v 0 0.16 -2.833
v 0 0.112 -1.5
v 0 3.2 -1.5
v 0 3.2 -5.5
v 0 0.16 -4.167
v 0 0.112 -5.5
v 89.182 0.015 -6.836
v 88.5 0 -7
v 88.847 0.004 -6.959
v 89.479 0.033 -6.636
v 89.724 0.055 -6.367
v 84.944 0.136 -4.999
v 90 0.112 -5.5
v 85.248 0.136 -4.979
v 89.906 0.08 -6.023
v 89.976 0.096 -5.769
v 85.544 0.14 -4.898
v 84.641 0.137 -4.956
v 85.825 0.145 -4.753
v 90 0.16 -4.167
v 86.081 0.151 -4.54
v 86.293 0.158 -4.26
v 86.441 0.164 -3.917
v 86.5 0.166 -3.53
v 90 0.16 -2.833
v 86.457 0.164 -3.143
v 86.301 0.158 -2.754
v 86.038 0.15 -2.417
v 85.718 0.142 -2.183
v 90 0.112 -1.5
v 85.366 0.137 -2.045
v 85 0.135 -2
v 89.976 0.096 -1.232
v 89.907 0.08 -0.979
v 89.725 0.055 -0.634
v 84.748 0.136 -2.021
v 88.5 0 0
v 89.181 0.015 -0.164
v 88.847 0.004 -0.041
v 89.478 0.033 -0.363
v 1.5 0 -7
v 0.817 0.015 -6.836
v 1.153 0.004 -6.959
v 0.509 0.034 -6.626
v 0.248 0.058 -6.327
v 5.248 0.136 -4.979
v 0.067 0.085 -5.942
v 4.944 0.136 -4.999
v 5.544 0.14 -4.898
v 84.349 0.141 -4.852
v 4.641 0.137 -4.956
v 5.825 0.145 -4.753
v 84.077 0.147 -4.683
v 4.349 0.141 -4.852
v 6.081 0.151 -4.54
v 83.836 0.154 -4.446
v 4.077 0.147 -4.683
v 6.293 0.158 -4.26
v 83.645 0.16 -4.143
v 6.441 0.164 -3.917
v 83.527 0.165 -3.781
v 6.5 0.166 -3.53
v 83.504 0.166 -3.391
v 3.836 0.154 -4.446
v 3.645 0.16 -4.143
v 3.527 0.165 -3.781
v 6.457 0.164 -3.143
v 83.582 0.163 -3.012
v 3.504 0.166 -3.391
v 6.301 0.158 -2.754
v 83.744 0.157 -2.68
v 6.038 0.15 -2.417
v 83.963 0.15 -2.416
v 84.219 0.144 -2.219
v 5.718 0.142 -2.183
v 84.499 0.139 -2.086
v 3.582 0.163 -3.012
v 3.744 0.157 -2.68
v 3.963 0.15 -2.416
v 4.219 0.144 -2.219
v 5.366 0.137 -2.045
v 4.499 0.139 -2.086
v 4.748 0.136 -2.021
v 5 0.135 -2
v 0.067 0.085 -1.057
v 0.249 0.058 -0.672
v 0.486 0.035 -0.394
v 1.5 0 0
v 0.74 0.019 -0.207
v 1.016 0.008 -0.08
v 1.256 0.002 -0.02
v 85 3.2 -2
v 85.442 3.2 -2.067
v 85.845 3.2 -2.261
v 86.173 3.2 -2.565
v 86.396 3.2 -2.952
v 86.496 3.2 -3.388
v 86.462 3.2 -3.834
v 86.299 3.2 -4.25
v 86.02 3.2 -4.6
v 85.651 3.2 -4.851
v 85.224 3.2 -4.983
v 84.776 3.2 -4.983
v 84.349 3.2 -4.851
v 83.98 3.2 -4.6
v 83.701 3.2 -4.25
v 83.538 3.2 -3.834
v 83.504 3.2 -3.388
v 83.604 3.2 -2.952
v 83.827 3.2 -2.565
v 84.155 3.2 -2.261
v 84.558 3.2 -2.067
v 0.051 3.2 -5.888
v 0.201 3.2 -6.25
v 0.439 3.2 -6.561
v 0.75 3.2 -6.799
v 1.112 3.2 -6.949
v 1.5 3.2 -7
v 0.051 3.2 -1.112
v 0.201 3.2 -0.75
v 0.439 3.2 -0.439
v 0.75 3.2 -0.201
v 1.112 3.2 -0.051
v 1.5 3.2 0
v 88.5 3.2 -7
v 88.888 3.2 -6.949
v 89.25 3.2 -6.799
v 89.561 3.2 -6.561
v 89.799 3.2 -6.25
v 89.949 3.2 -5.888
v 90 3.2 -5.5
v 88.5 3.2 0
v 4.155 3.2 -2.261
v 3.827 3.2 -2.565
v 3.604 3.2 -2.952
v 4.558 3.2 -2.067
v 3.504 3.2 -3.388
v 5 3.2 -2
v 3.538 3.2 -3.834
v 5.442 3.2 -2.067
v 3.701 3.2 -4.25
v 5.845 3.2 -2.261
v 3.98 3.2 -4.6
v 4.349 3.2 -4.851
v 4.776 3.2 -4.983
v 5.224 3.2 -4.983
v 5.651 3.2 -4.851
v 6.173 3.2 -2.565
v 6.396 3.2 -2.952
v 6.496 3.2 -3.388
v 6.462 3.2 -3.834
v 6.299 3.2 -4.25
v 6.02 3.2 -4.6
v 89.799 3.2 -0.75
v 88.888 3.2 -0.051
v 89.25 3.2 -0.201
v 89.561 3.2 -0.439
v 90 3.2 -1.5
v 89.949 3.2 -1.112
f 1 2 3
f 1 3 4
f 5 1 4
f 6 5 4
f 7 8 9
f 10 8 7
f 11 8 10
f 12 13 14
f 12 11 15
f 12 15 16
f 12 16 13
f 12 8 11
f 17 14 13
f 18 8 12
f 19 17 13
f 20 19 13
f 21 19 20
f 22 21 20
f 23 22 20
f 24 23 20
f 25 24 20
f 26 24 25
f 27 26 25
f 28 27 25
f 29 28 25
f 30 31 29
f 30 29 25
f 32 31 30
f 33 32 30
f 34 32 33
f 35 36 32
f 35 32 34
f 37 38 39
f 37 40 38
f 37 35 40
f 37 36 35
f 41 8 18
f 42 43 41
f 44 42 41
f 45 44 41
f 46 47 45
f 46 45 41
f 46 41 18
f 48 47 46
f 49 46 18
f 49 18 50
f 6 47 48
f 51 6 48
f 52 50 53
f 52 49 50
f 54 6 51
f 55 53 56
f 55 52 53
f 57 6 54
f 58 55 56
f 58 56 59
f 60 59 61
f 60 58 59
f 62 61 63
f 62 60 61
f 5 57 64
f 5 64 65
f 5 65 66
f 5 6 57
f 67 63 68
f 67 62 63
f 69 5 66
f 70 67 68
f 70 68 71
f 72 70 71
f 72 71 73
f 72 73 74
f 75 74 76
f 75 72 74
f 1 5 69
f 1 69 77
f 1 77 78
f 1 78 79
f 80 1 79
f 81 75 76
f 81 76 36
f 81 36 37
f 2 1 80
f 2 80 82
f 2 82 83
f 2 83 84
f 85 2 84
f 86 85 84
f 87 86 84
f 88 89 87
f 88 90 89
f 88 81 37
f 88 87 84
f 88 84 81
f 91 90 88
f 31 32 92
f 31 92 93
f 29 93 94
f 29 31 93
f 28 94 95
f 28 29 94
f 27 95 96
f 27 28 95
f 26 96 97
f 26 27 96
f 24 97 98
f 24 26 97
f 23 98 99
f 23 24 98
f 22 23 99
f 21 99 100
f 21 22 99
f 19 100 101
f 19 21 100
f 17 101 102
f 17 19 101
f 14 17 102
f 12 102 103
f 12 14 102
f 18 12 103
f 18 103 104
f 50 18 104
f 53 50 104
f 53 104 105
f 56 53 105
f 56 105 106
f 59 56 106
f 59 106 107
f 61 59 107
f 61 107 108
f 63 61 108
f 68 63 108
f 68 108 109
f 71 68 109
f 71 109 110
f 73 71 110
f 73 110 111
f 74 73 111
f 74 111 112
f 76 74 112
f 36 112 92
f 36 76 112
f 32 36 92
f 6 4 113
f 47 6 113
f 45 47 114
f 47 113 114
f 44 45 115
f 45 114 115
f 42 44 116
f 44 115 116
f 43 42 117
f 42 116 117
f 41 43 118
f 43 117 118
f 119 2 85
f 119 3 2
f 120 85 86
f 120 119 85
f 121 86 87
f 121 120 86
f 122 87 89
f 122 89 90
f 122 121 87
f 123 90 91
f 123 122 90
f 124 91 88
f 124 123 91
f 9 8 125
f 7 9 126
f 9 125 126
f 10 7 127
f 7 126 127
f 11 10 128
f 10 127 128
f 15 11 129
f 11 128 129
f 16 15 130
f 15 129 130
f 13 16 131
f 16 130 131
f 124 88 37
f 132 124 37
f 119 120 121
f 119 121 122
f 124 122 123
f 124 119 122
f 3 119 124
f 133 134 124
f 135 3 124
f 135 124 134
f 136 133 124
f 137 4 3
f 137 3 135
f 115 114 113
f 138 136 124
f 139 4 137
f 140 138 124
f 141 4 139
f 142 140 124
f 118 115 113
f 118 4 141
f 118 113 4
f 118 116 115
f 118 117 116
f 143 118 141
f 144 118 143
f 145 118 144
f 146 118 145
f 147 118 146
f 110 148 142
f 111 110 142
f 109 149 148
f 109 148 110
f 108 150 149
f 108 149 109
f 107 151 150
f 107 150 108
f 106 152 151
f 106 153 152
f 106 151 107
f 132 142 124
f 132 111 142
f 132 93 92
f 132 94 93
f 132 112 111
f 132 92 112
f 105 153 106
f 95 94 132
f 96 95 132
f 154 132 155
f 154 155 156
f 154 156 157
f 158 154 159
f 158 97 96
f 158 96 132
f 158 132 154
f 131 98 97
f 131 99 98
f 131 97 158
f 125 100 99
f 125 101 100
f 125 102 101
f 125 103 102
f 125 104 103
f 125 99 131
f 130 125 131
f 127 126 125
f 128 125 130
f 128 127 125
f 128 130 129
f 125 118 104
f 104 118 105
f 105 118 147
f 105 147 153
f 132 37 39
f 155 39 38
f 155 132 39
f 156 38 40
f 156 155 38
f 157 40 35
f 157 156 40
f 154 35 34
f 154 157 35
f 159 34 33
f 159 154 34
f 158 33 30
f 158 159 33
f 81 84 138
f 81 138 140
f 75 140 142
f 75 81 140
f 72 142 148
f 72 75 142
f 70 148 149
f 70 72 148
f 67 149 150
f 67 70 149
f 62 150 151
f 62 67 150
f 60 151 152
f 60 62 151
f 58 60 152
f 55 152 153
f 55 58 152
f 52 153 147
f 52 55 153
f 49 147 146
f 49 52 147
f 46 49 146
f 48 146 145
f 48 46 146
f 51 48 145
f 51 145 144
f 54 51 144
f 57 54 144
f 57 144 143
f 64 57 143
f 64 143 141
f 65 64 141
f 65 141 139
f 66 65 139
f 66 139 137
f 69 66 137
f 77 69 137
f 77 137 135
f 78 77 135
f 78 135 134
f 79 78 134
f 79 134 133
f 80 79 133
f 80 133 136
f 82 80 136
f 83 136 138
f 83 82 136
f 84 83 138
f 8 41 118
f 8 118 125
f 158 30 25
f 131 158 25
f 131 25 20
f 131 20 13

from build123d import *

# Parameters (mm, degrees)
SKETCH1_W               = 90
SKETCH1_H               = 7
SKETCH1_R               = 1.5
BOSS_EXTRUDE1_DEPTH     = 3.2
CUT_EXTRUDE1_DEPTH      = 91.328511556
CUT_EXTRUDE1_DEPTH_BACK = 91.328511556
FILLET1_R               = 1.5


with BuildPart() as part:
    # Sketch1 → Boss-Extrude1 (new body)
    with BuildSketch(Plane(origin=(0, 0, 0), x_dir=(1, 0, 0), z_dir=(0, 1, 0))):
        with Locations((45, 3.5)):
            Rectangle(SKETCH1_W, SKETCH1_H)
        with Locations(Location((5, 3.5, 0), (0, 0, 270))):
            Circle(SKETCH1_R, mode=Mode.SUBTRACT)
        with Locations(Location((85, 3.5, 0), (0, 0, 270))):
            Circle(SKETCH1_R, mode=Mode.SUBTRACT)
    extrude(amount=BOSS_EXTRUDE1_DEPTH)

    # Sketch2 → Cut-Extrude1 (cut, two sides: drawn at the far end of the back side and taken through both)
    with BuildSketch(Plane(origin=(90, 0, 0), x_dir=(0, 0, -1), z_dir=(1, 0, 0)).offset(-CUT_EXTRUDE1_DEPTH_BACK)):
        with BuildLine():
            Line((0, 0), (7, 0))
            ThreePointArc((7, 0), (3.5, 0.165912527), (0, 0))
        make_face()
    extrude(amount=CUT_EXTRUDE1_DEPTH + CUT_EXTRUDE1_DEPTH_BACK, mode=Mode.SUBTRACT)

    # Fillet1
    fillet1_edges = [part.edges().sort_by_distance(p)[0] for p in [
        (0, 1.6, -7),
        (90, 1.6, -7),
        (90, 1.6, 0),
        (0, 1.6, 0),
    ]]
    fillet(fillet1_edges, radius=FILLET1_R)


solid = part.part
